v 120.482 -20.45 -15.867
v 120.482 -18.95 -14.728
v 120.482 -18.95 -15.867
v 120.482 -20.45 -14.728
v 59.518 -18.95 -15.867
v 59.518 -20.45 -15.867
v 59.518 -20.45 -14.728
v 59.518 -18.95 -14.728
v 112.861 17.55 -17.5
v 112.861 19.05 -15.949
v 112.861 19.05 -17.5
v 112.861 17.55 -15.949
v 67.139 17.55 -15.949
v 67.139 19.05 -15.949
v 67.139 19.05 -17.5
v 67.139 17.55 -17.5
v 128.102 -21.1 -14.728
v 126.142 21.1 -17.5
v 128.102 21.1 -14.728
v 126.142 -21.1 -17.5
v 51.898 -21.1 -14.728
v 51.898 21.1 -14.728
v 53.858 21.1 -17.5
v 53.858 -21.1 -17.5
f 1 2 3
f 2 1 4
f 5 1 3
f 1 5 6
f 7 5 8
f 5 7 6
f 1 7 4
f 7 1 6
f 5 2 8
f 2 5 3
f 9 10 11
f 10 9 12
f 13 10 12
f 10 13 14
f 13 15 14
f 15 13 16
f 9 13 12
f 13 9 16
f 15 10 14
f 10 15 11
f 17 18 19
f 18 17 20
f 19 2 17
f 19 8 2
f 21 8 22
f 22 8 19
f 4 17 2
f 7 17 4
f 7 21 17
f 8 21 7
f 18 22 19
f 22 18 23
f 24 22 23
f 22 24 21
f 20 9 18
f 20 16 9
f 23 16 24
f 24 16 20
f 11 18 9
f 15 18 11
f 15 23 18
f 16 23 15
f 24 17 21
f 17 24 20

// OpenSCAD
include <MCAD/boxes.scad>

//Pill box with sliding lid

/* [Outside Box Dimensions] */
//Box Width (min: 5 x Wall Thickness)
bX=80; 
//Box Depth (min: 5 x Wall Thickness)
bY=45; 
//Box Height (min: 5 x Wall Thickness)
bZ=35;
//Corner Radius (radius of the corner fillet inside and outside)
corner=2; 
//X Dividers (0 for no dividers)
col=3; 
//Y Dividers (0 for no dividers)
row=2; 
//Divider Wall Thickness
divWall=1;

/* [Wall Thickness] */
//Wall Thickness (min: 2mm)
wall=2.8;

/* [Lid] */
//Lid Lip Width (min: 1mm)
lip=2;
//Snugness of Lid (values approaching 1.0 result in a snugger fit)
snug=.99; 

/* [Catch] */
//Catch Height (height over the lip for the catch)
catch=1.5;

/* [Hidden] */
boxDim=[bX, bY, bZ]; 
over=.5; //amount to extend parts that need to have interference (such as dividers)
module xDiv(inSide){
  xInc=inSide[0]/col;
  for ( i = [1 : col-1] ) {
    translate([i*xInc, 0, 0])cube([divWall, inSide[1]+over, inSide[2]+over], center=true);
  }
}


module yDiv(inSide){
  yInc=inSide[1]/row;
  for (i = [1 : row-1] ) {
    translate([0, i*yInc, 0])cube([inSide[0]+over, divWall, inSide[2]+over], center=true);
  }
}

module drawBox () {
  innerBox=[bX-(2*wall), bY-(2*wall), bZ-(2*wall)+.22];
  echo("innerBox=", innerBox);
  union() {
    difference() {
      roundedBox(boxDim, corner, sidesonly=1, $fn=36);
      roundedBox(innerBox, corner, sidesonly=1, $fn=20);
      translate([0, -wall, bZ/2+.1]) cutLid(0);
    }
    translate([-innerBox[0]/2, 0, -over/2]) xDiv(innerBox);
    translate([0, -innerBox[1]/2, -over/2]) yDiv(innerBox);
  }
}

module cutLid(shorten, catch) {
  //Create a trapezoid lid 

  insideLip=wall*1.2; //lip inside the box for the lid to rest upon
  lX=bX-(2*wall)+insideLip;
  lY=bY-shorten;

  echo("inside lip=", insideLip/2);

  //polygon points
  p0=[0, 0];
  p1=[lX, 0];
  p2=[lX-lip, wall];
  p3=[lip, wall];

  // this needs to be less than 45 deg to be usable
  echo("Lip Overhang (degrees)=", atan(lip/wall));
  
  difference() {
    rotate([90,0,0])
      translate([-lX/2, -wall, 0]) 
      linear_extrude(height=lY, center=true) polygon([p0, p1, p2, p3], paths=[[0,1,2,3]]);
    if (catch==1) {
      translate([0, lY/2-wall/2, -wall+catch/2]) cube([lX*.8, catch*1.5, catch*1.3], center=true);
      //Add an additional slot to make it easier to slide open the lid
      translate([0, -lY/2+wall, wall/3]) cube([lX*.6, catch*1.5, catch*5], center=true);
    } else {
      echo("catch=false");
    }

  }
}

module drawCatch() {
  rad=catch/2;
  lX=bX-2*(wall+.2);

  union() {
    translate([-lX/3, 0, 0]) sphere(r=rad, $fn=20);
    translate([ lX/3, 0, 0]) sphere(r=rad, $fn=20);
    rotate([0,90,0])cylinder(h=lX/1.5, r=rad, center=true, $fn=20);
  }
}

module assemble() {
    /*
    union() {
      drawBox();
      //move the catch to the front of the box
      translate([0, -(bY/2)+wall/2, bZ/2-wall]) drawCatch();
    }
    */
  //draw the lid (wall, 1) - second paramater specifies to add a hole for a catch
  translate([bX+10, 0, (-bZ/2)]) rotate([180, 0, 0]) scale([snug-.01, 1, snug]) cutLid(wall, 1);
}

assemble();
